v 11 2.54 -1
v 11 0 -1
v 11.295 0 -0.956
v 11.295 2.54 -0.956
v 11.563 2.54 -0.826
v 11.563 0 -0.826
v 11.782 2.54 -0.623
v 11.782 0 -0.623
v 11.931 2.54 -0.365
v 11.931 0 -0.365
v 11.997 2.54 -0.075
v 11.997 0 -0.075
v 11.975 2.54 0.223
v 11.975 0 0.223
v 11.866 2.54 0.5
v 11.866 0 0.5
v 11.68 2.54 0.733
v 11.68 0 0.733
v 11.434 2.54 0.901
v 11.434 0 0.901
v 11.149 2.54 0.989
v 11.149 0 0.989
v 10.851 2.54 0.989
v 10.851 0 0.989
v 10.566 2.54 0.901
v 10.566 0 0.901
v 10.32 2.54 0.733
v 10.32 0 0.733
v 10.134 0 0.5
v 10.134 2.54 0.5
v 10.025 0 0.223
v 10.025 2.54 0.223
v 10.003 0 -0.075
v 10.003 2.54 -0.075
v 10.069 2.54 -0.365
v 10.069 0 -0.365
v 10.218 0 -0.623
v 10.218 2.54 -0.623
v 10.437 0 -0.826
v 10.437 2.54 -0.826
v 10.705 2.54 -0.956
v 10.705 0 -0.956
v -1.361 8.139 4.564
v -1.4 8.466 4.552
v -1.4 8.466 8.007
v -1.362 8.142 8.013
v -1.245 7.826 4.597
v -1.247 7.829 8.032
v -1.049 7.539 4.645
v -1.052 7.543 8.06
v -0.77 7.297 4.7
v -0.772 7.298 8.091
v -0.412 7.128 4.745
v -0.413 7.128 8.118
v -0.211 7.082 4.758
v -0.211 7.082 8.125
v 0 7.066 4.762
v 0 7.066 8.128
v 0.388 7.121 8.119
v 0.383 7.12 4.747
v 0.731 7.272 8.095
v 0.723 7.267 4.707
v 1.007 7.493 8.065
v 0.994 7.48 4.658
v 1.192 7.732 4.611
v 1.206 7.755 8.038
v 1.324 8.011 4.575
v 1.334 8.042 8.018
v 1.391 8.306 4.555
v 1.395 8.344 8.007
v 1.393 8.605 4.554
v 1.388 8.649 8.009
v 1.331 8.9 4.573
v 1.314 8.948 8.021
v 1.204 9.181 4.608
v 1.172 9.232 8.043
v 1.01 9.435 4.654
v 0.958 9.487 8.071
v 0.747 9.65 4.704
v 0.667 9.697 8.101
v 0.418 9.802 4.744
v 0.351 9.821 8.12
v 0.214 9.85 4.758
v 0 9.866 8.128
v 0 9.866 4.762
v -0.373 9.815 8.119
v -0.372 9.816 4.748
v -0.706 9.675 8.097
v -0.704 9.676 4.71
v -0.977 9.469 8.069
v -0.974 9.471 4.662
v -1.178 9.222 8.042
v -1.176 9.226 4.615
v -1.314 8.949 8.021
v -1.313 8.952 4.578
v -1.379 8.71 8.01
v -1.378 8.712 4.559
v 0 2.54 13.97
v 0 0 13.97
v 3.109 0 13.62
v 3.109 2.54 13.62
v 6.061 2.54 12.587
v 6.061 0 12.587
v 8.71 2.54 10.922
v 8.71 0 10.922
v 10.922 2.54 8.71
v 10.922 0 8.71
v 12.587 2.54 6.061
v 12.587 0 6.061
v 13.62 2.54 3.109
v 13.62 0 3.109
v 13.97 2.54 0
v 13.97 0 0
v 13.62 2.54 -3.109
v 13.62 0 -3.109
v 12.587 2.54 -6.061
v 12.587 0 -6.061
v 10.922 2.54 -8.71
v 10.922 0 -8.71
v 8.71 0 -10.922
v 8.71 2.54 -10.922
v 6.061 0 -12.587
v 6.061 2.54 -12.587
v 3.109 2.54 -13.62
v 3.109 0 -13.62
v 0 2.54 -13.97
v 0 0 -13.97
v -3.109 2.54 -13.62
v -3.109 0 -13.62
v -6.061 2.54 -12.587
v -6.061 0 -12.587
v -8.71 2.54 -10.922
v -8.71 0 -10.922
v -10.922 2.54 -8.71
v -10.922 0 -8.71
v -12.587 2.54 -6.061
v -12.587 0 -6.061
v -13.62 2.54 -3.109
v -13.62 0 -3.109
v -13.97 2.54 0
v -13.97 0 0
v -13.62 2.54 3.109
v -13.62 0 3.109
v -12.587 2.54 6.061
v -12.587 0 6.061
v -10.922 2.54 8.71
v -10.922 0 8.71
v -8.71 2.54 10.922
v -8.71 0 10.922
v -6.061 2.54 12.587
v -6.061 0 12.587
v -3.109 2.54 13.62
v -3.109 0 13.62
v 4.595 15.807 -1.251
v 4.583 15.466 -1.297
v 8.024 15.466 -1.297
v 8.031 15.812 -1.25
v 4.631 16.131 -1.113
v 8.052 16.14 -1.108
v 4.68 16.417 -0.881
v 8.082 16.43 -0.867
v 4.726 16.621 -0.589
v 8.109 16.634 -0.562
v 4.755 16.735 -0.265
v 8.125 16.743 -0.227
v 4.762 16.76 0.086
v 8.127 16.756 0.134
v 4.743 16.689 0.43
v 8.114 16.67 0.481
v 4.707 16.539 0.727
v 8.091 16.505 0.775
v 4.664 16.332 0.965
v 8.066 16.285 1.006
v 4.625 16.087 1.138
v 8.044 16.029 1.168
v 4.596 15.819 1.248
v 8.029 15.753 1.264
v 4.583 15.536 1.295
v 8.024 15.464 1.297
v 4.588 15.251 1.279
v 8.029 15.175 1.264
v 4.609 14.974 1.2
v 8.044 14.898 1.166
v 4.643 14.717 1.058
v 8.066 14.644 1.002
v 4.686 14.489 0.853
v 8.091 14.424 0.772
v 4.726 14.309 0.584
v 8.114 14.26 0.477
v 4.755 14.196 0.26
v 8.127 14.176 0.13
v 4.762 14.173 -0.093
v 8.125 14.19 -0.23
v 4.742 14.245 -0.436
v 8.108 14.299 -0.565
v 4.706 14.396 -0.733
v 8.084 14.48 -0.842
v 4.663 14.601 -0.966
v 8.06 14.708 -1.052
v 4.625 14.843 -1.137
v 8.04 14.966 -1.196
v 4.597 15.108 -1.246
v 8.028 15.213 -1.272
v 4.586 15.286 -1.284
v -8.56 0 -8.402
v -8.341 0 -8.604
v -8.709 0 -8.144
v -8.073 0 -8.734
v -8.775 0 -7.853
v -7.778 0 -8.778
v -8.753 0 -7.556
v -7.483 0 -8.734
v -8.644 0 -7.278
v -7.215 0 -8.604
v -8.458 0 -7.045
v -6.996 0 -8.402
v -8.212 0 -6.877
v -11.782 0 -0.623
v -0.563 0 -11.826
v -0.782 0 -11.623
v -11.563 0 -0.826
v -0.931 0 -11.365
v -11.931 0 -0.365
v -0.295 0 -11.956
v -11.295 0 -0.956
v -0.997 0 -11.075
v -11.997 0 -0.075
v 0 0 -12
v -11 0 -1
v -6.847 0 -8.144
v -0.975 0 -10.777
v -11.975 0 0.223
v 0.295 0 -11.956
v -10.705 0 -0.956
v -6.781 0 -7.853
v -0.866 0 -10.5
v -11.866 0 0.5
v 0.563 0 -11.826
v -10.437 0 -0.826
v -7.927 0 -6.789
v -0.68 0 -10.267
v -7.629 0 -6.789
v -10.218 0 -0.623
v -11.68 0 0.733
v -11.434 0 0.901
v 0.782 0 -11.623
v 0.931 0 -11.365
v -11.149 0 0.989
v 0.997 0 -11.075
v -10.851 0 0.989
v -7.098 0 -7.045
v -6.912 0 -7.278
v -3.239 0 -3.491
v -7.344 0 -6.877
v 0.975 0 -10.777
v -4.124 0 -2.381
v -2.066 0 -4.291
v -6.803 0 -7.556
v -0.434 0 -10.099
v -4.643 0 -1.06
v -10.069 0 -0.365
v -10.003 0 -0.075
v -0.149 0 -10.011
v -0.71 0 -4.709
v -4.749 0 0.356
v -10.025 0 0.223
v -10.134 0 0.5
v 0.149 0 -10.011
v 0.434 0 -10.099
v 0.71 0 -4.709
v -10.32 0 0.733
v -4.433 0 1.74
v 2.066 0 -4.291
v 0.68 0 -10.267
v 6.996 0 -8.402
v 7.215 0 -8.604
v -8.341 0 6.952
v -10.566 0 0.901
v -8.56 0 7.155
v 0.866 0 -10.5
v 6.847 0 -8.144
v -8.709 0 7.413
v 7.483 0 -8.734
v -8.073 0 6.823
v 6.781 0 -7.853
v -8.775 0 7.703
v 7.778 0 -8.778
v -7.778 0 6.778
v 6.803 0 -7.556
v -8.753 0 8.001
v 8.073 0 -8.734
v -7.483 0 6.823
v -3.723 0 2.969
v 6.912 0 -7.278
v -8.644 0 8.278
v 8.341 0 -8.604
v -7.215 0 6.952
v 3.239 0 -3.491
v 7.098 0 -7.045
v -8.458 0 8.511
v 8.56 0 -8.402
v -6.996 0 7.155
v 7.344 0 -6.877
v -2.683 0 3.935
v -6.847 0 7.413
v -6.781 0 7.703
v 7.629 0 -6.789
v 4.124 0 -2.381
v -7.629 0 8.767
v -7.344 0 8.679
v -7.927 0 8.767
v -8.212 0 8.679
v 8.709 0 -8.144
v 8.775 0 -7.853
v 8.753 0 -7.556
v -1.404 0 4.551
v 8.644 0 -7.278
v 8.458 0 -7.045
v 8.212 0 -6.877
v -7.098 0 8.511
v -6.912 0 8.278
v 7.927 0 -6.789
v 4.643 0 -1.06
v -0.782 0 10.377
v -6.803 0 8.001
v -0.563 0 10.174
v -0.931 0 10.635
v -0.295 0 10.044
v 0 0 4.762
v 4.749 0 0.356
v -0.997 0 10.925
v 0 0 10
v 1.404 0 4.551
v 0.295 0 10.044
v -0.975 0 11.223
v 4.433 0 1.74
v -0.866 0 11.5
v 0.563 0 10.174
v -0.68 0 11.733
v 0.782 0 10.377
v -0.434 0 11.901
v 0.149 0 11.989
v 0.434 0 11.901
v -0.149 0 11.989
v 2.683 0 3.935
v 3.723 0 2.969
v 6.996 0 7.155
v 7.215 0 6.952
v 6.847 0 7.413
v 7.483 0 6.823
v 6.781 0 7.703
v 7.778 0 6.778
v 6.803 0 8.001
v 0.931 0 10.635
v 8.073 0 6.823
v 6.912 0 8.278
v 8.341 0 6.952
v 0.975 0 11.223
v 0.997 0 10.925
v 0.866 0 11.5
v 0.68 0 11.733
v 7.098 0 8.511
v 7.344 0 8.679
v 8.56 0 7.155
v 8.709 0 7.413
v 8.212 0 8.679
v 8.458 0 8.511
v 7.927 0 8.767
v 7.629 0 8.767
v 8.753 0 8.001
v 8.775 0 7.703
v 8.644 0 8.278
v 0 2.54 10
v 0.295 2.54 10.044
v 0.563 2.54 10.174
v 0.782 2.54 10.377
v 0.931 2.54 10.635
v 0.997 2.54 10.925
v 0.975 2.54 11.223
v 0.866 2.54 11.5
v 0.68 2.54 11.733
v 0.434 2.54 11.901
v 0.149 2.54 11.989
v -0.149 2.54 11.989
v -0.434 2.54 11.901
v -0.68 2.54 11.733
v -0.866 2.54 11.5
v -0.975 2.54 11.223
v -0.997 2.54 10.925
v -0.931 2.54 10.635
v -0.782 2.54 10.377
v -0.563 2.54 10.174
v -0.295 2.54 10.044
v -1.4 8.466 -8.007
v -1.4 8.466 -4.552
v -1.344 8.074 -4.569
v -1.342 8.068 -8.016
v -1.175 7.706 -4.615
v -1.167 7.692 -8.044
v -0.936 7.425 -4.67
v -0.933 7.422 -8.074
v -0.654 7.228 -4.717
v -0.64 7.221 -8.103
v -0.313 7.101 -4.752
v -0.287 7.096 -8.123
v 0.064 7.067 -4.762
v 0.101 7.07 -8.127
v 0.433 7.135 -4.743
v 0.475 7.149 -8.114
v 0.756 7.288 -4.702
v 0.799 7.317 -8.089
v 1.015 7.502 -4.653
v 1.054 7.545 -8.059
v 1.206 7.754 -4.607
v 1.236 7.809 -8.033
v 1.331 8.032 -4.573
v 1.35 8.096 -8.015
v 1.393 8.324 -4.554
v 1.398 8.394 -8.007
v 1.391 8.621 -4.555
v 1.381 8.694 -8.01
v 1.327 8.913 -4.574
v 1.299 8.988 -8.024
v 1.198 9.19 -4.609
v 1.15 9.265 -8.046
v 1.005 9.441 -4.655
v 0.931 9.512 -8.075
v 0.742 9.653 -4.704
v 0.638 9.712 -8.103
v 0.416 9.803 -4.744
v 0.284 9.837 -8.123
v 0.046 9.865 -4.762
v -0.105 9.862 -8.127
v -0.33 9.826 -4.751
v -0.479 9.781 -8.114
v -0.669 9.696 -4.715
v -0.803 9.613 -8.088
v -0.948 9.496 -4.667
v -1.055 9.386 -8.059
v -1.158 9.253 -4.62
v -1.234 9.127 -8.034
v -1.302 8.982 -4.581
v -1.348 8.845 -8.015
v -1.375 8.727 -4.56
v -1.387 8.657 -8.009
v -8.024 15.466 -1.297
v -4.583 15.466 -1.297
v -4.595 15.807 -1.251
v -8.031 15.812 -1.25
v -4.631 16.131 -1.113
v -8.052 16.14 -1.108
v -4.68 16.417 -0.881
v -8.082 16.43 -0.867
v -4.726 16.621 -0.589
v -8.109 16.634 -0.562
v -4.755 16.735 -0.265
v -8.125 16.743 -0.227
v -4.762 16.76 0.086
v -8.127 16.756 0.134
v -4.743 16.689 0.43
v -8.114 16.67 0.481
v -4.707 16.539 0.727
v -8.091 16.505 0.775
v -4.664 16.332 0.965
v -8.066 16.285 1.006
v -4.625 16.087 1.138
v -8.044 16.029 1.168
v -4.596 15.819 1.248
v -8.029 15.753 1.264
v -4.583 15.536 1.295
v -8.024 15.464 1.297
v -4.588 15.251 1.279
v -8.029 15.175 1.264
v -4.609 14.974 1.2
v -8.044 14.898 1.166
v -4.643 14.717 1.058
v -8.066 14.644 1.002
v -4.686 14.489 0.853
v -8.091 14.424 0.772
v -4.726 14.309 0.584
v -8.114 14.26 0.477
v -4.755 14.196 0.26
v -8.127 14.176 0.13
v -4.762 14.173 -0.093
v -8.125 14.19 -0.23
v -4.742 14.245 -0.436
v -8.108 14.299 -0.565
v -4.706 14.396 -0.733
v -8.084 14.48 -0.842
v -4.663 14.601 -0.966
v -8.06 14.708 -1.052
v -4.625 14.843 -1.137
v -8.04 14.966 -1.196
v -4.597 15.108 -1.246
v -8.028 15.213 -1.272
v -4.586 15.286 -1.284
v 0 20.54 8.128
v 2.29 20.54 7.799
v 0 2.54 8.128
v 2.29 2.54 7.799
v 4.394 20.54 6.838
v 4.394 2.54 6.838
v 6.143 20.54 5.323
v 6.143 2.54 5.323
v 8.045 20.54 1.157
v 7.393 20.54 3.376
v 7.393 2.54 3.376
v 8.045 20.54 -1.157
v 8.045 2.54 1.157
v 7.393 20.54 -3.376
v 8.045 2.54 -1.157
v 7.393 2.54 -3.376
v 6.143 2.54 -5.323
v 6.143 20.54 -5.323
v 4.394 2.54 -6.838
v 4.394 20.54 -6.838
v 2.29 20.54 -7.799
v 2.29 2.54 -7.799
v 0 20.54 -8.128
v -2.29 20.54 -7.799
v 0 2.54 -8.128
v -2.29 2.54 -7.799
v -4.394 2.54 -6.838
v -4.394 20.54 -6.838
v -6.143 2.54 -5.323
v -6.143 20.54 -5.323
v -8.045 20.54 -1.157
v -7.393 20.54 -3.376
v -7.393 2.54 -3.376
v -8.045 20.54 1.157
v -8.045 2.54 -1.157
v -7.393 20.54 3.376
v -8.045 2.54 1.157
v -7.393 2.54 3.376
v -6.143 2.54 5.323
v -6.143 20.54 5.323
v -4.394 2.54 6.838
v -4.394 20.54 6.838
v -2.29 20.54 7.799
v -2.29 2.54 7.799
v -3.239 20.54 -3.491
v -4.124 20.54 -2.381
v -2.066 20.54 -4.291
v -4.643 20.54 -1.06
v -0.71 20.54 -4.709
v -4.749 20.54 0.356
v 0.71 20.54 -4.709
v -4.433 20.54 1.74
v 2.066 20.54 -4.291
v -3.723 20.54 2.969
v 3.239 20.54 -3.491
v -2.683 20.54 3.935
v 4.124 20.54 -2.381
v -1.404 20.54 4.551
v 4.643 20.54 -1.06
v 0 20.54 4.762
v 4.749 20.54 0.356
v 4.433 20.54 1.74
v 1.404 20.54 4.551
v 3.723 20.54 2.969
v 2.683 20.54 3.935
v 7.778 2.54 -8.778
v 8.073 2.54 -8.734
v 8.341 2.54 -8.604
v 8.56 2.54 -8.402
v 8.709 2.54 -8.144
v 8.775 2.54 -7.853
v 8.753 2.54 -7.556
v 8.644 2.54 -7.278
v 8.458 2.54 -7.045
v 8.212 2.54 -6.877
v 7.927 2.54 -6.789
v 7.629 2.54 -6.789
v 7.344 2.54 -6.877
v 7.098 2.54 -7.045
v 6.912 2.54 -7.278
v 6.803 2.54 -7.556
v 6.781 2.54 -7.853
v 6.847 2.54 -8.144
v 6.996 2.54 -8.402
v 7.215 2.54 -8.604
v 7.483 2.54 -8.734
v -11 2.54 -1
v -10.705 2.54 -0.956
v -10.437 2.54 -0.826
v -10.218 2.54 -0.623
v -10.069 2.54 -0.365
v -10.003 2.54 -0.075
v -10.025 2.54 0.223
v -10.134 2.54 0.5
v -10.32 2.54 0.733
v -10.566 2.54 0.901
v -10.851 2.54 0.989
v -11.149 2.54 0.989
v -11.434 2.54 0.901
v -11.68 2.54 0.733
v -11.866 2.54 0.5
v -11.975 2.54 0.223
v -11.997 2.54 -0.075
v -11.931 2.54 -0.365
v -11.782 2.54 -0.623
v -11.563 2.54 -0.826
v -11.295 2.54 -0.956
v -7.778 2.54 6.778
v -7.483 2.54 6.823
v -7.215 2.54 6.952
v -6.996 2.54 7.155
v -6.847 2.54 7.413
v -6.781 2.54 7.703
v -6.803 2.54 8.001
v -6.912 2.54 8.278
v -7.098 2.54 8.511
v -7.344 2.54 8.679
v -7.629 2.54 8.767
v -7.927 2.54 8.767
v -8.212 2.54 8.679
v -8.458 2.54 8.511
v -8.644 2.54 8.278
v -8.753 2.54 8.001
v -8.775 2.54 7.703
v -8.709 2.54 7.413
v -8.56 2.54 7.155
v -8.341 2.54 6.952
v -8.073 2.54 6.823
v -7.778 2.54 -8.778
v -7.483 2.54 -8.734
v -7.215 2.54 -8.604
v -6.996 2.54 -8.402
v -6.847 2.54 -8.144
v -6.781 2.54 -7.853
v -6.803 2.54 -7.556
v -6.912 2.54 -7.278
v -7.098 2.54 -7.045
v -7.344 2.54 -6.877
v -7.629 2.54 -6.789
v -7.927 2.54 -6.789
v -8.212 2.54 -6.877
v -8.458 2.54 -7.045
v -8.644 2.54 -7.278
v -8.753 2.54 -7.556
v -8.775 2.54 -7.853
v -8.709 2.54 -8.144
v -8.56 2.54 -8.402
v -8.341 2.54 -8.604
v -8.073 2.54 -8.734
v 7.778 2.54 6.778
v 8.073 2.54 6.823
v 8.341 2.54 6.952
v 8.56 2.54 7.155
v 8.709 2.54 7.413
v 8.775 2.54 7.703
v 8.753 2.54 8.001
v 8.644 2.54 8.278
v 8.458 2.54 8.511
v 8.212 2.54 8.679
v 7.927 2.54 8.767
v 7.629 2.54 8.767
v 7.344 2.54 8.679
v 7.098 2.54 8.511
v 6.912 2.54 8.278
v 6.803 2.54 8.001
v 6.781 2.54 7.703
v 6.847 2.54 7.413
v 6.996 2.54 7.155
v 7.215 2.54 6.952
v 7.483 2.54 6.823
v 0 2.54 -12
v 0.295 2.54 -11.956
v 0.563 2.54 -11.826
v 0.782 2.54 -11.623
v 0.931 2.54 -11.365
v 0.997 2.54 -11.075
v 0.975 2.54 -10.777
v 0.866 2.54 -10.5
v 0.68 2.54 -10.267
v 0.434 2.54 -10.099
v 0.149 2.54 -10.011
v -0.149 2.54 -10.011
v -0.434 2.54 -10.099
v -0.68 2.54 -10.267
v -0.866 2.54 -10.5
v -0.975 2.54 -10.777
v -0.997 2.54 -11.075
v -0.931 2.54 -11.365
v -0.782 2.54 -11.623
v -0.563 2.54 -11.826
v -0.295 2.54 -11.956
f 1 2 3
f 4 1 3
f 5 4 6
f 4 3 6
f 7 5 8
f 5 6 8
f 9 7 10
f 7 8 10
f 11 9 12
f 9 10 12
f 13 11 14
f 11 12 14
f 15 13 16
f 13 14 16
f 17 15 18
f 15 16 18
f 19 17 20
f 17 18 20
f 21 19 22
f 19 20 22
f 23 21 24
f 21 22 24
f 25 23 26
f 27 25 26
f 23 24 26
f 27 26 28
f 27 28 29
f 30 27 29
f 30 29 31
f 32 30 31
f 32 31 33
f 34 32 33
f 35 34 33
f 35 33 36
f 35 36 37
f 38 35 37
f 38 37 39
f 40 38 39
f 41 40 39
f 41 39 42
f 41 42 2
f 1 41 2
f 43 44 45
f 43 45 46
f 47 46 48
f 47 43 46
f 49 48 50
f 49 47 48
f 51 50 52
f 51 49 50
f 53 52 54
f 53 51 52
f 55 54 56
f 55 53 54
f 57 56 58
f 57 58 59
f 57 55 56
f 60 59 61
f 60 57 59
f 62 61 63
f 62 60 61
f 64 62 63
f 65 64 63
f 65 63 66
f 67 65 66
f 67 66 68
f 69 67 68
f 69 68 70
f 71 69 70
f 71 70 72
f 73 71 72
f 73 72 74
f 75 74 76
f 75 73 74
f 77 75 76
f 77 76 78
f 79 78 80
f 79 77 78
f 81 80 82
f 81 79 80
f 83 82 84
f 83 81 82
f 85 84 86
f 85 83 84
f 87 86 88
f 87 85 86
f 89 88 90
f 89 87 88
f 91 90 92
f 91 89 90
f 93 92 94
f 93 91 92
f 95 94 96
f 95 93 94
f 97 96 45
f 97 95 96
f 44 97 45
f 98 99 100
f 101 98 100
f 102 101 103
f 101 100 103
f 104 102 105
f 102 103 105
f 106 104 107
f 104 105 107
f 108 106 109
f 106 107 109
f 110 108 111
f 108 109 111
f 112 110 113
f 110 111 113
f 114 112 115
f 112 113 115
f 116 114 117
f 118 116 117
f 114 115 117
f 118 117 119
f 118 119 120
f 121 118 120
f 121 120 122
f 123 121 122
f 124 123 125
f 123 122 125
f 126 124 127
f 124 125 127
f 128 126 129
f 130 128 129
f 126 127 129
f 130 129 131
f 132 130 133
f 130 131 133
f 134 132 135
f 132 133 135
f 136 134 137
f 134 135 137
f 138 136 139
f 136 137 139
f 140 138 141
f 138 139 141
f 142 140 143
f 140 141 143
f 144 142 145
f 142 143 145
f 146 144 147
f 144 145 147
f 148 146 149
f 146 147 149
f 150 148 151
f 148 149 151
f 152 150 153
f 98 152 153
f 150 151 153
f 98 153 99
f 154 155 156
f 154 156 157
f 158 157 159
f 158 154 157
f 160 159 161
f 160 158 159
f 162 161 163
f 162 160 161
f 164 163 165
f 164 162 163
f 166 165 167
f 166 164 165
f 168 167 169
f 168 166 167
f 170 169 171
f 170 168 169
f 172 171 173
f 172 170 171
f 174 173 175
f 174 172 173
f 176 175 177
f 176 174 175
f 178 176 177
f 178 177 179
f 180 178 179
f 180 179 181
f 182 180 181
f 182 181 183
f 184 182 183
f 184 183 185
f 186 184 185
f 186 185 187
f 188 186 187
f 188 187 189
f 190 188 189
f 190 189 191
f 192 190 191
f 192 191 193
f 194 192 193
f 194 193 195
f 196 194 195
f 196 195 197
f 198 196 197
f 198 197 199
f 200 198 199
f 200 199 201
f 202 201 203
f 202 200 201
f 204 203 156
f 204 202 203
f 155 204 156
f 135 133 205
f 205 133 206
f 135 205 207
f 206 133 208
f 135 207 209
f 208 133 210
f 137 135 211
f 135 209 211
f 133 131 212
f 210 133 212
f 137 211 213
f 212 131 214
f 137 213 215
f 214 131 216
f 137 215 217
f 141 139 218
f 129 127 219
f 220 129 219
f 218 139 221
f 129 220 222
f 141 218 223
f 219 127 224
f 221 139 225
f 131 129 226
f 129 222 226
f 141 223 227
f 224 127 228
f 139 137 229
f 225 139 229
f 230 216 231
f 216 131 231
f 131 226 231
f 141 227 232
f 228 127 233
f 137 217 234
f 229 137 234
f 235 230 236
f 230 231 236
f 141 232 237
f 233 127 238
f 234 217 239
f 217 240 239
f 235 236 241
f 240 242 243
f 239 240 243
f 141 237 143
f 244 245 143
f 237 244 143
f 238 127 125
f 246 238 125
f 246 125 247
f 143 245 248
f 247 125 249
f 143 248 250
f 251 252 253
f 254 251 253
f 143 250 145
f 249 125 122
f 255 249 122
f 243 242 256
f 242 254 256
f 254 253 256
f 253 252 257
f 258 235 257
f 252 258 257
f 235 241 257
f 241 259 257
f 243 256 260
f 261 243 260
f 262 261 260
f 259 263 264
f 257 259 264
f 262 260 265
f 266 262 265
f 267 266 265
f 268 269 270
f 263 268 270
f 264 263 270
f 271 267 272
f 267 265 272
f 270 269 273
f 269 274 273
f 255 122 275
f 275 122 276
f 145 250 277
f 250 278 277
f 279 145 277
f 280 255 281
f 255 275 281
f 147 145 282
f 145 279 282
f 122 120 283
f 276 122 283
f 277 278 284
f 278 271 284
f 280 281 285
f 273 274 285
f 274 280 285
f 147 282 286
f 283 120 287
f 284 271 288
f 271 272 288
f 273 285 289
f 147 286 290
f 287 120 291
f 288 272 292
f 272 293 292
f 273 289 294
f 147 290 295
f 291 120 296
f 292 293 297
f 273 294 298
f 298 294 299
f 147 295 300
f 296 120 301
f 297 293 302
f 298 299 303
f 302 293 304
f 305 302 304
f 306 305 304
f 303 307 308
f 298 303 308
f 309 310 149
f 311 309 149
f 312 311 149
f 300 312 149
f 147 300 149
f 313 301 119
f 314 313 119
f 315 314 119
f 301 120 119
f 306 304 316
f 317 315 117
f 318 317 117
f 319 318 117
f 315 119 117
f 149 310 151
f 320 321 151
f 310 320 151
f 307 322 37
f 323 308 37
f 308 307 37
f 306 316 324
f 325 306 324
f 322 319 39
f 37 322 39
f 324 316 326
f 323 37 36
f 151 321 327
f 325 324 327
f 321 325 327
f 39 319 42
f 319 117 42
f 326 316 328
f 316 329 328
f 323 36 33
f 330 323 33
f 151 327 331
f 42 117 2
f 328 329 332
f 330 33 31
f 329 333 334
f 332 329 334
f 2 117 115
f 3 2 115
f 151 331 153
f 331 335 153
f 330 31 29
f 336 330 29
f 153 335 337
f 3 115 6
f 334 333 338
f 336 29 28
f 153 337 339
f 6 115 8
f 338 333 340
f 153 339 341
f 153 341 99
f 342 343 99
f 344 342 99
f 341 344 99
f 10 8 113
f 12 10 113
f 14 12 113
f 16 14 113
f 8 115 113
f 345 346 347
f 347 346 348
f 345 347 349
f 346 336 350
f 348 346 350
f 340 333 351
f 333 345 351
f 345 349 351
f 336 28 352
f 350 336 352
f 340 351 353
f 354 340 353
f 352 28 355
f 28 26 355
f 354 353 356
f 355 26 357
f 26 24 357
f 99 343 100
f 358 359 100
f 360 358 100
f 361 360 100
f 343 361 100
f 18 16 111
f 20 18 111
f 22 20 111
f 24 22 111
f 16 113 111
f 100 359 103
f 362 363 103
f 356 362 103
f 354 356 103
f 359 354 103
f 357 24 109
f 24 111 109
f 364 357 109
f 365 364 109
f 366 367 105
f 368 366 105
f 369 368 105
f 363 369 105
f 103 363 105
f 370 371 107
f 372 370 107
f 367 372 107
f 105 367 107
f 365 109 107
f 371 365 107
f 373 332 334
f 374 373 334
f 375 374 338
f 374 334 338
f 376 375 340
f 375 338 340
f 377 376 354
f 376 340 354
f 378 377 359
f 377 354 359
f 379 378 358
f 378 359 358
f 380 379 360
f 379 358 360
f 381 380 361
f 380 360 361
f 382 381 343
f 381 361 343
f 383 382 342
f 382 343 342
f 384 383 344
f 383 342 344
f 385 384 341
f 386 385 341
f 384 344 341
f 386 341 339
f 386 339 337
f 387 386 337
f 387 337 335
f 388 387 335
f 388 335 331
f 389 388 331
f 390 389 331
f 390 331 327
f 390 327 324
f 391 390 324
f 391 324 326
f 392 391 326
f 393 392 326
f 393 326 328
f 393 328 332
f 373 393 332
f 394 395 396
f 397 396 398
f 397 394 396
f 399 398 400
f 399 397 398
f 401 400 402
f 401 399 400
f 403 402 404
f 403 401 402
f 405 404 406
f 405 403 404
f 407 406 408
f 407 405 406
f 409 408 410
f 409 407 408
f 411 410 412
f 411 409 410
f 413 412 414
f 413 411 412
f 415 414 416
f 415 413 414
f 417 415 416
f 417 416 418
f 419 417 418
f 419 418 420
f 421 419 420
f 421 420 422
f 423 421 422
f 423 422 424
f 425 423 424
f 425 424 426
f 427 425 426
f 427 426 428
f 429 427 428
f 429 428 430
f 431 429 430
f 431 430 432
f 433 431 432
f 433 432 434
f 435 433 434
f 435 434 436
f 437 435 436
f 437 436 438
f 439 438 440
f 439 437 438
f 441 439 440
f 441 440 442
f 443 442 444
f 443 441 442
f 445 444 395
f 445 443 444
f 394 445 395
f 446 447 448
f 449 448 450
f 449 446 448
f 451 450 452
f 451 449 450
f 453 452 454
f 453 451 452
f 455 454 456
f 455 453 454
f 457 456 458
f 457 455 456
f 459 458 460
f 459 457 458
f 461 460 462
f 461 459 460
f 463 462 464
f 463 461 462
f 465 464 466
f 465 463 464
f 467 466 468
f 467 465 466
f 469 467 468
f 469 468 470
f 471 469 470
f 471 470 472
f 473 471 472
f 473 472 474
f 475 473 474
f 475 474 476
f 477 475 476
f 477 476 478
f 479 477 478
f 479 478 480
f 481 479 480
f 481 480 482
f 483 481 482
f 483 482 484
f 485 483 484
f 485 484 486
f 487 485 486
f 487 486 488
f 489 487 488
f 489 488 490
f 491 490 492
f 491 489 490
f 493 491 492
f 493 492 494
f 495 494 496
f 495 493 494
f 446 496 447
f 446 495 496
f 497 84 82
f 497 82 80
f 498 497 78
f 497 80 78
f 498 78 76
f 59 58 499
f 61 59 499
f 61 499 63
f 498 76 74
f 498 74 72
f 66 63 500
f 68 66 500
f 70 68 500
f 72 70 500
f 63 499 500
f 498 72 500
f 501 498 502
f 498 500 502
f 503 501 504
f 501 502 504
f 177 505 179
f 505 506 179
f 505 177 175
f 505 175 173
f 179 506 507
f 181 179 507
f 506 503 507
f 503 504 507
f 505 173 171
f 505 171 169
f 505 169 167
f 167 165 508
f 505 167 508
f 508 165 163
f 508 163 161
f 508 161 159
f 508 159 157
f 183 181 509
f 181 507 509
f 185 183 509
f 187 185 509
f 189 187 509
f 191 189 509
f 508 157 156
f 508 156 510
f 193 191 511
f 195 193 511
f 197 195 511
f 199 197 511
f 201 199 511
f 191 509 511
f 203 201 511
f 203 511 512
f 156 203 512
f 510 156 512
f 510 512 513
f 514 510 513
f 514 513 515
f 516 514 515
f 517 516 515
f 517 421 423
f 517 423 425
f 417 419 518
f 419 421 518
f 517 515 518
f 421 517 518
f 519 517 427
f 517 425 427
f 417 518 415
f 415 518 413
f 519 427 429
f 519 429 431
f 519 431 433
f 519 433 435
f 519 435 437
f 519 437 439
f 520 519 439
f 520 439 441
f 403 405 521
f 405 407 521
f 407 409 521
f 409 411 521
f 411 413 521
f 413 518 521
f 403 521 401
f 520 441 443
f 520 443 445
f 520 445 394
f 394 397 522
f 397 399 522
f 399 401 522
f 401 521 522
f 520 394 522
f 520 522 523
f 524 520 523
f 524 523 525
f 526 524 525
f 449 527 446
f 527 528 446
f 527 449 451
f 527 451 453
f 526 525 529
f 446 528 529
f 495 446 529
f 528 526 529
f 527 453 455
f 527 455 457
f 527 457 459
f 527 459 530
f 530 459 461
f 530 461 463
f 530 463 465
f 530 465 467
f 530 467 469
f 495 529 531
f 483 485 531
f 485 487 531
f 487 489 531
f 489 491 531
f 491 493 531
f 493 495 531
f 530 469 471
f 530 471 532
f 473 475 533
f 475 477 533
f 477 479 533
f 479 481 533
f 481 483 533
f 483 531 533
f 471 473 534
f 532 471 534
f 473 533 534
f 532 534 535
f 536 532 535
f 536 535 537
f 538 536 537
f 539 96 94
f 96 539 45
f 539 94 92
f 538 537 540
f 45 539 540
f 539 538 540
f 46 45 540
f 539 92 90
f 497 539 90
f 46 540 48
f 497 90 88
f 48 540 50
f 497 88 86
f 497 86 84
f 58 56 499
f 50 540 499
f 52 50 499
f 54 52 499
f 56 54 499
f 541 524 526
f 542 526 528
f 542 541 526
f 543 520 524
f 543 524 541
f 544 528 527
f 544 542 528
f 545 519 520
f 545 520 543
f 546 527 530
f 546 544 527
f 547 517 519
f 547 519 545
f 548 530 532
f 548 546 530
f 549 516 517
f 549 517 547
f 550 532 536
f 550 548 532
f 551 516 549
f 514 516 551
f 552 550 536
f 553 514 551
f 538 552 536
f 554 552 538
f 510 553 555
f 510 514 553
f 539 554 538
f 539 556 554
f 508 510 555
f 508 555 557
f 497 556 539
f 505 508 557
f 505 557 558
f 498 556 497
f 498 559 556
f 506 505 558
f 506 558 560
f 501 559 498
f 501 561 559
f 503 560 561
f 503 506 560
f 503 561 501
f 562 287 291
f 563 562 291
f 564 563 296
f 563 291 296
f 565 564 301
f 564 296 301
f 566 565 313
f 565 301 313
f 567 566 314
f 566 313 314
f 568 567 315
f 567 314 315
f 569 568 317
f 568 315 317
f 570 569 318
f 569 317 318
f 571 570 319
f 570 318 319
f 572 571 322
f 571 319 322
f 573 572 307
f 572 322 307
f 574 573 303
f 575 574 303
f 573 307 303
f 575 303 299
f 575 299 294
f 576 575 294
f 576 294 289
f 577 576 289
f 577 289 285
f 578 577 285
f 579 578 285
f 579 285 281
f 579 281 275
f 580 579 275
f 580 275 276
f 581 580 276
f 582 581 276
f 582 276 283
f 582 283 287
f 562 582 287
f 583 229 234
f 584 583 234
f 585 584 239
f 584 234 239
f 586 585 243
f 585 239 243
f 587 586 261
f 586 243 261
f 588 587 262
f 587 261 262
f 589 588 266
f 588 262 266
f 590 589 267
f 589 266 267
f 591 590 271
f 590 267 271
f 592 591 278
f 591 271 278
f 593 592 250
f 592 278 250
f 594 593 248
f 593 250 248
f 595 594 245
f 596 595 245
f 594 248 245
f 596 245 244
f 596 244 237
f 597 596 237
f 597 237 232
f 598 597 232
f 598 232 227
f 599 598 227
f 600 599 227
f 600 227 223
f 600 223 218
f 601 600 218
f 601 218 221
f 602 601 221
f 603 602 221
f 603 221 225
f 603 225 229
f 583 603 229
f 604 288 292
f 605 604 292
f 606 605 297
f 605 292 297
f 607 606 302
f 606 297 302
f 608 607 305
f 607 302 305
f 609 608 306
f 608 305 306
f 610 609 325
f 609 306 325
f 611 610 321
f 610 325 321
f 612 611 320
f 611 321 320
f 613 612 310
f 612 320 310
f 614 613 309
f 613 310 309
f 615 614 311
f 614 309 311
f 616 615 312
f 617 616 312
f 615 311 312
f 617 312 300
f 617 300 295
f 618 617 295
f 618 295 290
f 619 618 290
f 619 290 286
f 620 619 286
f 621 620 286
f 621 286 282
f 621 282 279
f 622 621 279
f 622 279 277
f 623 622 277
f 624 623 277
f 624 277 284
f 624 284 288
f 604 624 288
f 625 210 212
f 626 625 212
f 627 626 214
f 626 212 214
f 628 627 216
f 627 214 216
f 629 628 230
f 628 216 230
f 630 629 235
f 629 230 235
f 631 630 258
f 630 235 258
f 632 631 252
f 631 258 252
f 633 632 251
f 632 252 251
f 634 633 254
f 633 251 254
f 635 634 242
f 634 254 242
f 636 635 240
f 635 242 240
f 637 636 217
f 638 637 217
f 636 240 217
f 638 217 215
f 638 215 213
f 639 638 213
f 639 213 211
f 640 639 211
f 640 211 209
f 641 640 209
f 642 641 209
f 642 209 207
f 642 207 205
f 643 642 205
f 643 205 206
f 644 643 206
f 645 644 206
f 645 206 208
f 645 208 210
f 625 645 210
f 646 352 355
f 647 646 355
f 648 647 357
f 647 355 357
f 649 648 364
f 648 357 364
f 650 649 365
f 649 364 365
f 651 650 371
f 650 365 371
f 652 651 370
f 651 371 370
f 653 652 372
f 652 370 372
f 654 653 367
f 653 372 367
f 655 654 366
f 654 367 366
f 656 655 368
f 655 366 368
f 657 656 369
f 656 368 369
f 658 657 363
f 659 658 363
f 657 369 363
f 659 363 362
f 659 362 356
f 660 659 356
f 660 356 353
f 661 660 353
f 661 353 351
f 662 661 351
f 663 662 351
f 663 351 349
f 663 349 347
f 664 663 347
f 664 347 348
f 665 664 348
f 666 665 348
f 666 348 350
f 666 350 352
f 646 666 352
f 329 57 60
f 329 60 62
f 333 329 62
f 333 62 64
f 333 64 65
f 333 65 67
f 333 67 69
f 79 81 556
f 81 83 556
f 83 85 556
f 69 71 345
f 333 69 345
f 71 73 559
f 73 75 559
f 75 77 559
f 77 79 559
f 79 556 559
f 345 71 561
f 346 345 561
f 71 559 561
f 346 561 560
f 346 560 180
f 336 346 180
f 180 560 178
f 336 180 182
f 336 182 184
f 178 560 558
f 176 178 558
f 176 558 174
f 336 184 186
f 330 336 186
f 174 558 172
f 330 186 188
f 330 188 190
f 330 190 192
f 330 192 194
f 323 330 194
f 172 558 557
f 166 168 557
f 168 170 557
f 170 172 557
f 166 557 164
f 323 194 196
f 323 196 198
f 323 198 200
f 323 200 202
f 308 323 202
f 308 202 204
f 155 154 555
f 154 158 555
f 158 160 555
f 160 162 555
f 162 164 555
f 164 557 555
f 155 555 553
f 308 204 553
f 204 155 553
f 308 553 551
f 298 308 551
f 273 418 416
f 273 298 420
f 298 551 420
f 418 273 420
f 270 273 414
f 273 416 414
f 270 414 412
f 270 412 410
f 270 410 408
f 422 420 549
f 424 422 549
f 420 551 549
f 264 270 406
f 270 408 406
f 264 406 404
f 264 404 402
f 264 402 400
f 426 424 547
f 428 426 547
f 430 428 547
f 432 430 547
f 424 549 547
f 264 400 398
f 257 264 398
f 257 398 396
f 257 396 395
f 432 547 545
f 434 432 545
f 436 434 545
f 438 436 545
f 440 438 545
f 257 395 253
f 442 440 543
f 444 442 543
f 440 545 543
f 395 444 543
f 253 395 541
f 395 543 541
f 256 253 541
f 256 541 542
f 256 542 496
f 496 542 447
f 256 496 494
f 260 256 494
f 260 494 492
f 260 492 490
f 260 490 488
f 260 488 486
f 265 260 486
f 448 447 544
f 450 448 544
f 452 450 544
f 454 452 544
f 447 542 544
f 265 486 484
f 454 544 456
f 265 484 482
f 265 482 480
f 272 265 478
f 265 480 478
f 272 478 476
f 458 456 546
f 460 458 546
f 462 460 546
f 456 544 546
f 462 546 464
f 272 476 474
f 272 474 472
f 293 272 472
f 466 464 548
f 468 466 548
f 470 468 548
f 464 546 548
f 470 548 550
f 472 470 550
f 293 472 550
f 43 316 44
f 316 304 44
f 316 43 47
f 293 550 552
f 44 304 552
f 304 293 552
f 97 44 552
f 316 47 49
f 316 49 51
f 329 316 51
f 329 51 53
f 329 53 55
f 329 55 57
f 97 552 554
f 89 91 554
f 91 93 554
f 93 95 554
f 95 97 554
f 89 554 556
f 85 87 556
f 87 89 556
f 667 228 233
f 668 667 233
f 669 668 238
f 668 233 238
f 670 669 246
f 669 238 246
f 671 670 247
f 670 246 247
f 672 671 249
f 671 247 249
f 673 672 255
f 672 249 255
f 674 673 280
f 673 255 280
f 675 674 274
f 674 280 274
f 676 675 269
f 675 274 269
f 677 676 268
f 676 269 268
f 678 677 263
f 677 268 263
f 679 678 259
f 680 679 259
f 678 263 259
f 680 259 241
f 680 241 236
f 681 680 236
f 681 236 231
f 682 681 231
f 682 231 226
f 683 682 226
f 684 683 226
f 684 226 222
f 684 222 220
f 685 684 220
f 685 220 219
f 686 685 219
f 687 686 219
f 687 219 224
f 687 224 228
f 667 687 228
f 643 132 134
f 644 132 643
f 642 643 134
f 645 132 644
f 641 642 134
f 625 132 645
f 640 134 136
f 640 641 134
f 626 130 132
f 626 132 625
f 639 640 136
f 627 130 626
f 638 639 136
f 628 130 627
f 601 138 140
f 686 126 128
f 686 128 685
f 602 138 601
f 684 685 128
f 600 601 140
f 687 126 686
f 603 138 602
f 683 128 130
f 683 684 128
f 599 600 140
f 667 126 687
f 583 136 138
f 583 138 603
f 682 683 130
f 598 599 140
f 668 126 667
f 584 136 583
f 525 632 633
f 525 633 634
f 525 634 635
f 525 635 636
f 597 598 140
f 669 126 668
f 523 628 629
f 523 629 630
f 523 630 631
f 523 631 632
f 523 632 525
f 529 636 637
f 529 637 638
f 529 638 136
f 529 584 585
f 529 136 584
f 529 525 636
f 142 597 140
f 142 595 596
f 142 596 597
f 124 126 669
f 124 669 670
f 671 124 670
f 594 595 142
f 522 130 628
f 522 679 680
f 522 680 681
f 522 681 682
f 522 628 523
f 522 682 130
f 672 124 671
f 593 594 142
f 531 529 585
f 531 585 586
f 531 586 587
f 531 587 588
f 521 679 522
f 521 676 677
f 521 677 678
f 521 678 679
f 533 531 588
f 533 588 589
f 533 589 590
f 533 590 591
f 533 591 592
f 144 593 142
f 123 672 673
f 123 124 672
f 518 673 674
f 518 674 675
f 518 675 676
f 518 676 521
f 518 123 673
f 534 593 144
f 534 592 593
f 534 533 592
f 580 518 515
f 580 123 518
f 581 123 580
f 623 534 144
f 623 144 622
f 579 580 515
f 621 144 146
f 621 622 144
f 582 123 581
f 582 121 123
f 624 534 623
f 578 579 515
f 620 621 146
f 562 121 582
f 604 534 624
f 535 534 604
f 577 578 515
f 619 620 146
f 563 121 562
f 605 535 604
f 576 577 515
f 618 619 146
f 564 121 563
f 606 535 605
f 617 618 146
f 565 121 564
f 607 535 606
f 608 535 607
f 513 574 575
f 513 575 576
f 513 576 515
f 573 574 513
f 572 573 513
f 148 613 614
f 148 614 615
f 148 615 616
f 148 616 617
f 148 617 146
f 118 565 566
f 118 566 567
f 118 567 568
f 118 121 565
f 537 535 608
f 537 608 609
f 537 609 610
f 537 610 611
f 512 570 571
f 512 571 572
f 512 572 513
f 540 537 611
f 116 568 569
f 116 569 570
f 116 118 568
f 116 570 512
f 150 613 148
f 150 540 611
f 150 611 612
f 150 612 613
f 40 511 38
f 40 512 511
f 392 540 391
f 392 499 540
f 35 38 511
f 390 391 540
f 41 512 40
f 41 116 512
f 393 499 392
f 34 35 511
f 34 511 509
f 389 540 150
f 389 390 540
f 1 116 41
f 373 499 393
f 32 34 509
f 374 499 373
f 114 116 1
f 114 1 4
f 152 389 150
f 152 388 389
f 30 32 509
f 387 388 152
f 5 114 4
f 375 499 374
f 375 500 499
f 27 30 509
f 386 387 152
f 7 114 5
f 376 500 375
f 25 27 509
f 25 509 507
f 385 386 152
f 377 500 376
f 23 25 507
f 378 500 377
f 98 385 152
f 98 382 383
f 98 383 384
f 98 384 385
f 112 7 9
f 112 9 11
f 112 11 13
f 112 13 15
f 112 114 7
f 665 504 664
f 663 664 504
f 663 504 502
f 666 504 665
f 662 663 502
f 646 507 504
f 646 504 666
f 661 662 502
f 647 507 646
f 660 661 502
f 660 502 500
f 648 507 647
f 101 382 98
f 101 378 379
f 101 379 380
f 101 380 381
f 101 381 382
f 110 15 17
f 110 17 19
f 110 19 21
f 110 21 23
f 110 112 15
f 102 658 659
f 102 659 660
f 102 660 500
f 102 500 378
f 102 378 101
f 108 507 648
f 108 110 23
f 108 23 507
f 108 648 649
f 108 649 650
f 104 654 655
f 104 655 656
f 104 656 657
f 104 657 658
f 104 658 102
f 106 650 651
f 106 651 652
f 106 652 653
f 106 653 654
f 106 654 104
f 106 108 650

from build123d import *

# Parameters (mm, degrees)
SKETCH1_R               = 13.97
BOSS_EXTRUDE1_DEPTH     = 2.54
SKETCH2_R               = 8.128
BOSS_EXTRUDE2_DEPTH     = 18
SKETCH6_R               = 1
CUT_EXTRUDE2_DEPTH      = 29.499357888
SKETCH7_R               = 4.7625
CUT_EXTRUDE3_DEPTH      = 25.4
CUT_EXTRUDE6_DEPTH      = 24.13
CUT_EXTRUDE6_DEPTH_BACK = 24.13
SKETCH11_R              = 1.4
CUT_EXTRUDE7_DEPTH      = 29.49935796
CUT_EXTRUDE7_DEPTH_BACK = 29.49935796
SKETCH12_R              = 1.296623243


with BuildPart() as part:
    # Sketch1 → Boss-Extrude1 (new body)
    with BuildSketch(Plane(origin=(0, 0, 0), x_dir=(1, 0, 0), z_dir=(0, 1, 0))):
        Circle(SKETCH1_R)
    extrude(amount=BOSS_EXTRUDE1_DEPTH)

    # Sketch2 → Boss-Extrude2 (add)
    with BuildSketch(Plane(origin=(0, 2.54, 0), x_dir=(1, 0, 0), z_dir=(0, 1, 0))):
        Circle(SKETCH2_R)
    extrude(amount=BOSS_EXTRUDE2_DEPTH)

    # Sketch6 → Cut-Extrude2 (cut, through all)
    with BuildSketch(Plane(origin=(0, 0, 0), x_dir=(-1, 0, 0), z_dir=(0, -1, 0))):
        with Locations((-11, 0)):
            Circle(SKETCH6_R)
        with Locations((-7.778174593, 7.778174593)):
            Circle(SKETCH6_R)
        with Locations((0, 11)):
            Circle(SKETCH6_R)
        with Locations((7.778174593, 7.778174593)):
            Circle(SKETCH6_R)
        with Locations((11, 0)):
            Circle(SKETCH6_R)
        with Locations((7.778174593, -7.778174593)):
            Circle(SKETCH6_R)
        with Locations((0, -11)):
            Circle(SKETCH6_R)
        with Locations((-7.778174593, -7.778174593)):
            Circle(SKETCH6_R)
    extrude(amount=-CUT_EXTRUDE2_DEPTH, mode=Mode.SUBTRACT)

    # Sketch7 → Cut-Extrude3 (cut)
    with BuildSketch(Plane(origin=(0, 20.54, 0), x_dir=(1, 0, 0), z_dir=(0, 1, 0))):
        Circle(SKETCH7_R)
    extrude(amount=-CUT_EXTRUDE3_DEPTH, mode=Mode.SUBTRACT)

    # Sketch11 → Cut-Extrude6 (cut, two sides: drawn at the far end of the back side and taken through both)
    with BuildSketch(Plane.XY.offset(-CUT_EXTRUDE6_DEPTH_BACK)):
        with Locations((0, 8.466000018)):
            Circle(SKETCH11_R)
    extrude(amount=CUT_EXTRUDE6_DEPTH + CUT_EXTRUDE6_DEPTH_BACK, mode=Mode.SUBTRACT)

    # Sketch12 → Cut-Extrude7 (cut, two sides: drawn at the far end of the back side and taken through both)
    with BuildSketch(Plane(origin=(0, 0, 0), x_dir=(0, 0, -1), z_dir=(1, 0, 0)).offset(-CUT_EXTRUDE7_DEPTH_BACK)):
        with Locations((0, 15.466)):
            Circle(SKETCH12_R)
    extrude(amount=CUT_EXTRUDE7_DEPTH + CUT_EXTRUDE7_DEPTH_BACK, mode=Mode.SUBTRACT)


solid = part.part
